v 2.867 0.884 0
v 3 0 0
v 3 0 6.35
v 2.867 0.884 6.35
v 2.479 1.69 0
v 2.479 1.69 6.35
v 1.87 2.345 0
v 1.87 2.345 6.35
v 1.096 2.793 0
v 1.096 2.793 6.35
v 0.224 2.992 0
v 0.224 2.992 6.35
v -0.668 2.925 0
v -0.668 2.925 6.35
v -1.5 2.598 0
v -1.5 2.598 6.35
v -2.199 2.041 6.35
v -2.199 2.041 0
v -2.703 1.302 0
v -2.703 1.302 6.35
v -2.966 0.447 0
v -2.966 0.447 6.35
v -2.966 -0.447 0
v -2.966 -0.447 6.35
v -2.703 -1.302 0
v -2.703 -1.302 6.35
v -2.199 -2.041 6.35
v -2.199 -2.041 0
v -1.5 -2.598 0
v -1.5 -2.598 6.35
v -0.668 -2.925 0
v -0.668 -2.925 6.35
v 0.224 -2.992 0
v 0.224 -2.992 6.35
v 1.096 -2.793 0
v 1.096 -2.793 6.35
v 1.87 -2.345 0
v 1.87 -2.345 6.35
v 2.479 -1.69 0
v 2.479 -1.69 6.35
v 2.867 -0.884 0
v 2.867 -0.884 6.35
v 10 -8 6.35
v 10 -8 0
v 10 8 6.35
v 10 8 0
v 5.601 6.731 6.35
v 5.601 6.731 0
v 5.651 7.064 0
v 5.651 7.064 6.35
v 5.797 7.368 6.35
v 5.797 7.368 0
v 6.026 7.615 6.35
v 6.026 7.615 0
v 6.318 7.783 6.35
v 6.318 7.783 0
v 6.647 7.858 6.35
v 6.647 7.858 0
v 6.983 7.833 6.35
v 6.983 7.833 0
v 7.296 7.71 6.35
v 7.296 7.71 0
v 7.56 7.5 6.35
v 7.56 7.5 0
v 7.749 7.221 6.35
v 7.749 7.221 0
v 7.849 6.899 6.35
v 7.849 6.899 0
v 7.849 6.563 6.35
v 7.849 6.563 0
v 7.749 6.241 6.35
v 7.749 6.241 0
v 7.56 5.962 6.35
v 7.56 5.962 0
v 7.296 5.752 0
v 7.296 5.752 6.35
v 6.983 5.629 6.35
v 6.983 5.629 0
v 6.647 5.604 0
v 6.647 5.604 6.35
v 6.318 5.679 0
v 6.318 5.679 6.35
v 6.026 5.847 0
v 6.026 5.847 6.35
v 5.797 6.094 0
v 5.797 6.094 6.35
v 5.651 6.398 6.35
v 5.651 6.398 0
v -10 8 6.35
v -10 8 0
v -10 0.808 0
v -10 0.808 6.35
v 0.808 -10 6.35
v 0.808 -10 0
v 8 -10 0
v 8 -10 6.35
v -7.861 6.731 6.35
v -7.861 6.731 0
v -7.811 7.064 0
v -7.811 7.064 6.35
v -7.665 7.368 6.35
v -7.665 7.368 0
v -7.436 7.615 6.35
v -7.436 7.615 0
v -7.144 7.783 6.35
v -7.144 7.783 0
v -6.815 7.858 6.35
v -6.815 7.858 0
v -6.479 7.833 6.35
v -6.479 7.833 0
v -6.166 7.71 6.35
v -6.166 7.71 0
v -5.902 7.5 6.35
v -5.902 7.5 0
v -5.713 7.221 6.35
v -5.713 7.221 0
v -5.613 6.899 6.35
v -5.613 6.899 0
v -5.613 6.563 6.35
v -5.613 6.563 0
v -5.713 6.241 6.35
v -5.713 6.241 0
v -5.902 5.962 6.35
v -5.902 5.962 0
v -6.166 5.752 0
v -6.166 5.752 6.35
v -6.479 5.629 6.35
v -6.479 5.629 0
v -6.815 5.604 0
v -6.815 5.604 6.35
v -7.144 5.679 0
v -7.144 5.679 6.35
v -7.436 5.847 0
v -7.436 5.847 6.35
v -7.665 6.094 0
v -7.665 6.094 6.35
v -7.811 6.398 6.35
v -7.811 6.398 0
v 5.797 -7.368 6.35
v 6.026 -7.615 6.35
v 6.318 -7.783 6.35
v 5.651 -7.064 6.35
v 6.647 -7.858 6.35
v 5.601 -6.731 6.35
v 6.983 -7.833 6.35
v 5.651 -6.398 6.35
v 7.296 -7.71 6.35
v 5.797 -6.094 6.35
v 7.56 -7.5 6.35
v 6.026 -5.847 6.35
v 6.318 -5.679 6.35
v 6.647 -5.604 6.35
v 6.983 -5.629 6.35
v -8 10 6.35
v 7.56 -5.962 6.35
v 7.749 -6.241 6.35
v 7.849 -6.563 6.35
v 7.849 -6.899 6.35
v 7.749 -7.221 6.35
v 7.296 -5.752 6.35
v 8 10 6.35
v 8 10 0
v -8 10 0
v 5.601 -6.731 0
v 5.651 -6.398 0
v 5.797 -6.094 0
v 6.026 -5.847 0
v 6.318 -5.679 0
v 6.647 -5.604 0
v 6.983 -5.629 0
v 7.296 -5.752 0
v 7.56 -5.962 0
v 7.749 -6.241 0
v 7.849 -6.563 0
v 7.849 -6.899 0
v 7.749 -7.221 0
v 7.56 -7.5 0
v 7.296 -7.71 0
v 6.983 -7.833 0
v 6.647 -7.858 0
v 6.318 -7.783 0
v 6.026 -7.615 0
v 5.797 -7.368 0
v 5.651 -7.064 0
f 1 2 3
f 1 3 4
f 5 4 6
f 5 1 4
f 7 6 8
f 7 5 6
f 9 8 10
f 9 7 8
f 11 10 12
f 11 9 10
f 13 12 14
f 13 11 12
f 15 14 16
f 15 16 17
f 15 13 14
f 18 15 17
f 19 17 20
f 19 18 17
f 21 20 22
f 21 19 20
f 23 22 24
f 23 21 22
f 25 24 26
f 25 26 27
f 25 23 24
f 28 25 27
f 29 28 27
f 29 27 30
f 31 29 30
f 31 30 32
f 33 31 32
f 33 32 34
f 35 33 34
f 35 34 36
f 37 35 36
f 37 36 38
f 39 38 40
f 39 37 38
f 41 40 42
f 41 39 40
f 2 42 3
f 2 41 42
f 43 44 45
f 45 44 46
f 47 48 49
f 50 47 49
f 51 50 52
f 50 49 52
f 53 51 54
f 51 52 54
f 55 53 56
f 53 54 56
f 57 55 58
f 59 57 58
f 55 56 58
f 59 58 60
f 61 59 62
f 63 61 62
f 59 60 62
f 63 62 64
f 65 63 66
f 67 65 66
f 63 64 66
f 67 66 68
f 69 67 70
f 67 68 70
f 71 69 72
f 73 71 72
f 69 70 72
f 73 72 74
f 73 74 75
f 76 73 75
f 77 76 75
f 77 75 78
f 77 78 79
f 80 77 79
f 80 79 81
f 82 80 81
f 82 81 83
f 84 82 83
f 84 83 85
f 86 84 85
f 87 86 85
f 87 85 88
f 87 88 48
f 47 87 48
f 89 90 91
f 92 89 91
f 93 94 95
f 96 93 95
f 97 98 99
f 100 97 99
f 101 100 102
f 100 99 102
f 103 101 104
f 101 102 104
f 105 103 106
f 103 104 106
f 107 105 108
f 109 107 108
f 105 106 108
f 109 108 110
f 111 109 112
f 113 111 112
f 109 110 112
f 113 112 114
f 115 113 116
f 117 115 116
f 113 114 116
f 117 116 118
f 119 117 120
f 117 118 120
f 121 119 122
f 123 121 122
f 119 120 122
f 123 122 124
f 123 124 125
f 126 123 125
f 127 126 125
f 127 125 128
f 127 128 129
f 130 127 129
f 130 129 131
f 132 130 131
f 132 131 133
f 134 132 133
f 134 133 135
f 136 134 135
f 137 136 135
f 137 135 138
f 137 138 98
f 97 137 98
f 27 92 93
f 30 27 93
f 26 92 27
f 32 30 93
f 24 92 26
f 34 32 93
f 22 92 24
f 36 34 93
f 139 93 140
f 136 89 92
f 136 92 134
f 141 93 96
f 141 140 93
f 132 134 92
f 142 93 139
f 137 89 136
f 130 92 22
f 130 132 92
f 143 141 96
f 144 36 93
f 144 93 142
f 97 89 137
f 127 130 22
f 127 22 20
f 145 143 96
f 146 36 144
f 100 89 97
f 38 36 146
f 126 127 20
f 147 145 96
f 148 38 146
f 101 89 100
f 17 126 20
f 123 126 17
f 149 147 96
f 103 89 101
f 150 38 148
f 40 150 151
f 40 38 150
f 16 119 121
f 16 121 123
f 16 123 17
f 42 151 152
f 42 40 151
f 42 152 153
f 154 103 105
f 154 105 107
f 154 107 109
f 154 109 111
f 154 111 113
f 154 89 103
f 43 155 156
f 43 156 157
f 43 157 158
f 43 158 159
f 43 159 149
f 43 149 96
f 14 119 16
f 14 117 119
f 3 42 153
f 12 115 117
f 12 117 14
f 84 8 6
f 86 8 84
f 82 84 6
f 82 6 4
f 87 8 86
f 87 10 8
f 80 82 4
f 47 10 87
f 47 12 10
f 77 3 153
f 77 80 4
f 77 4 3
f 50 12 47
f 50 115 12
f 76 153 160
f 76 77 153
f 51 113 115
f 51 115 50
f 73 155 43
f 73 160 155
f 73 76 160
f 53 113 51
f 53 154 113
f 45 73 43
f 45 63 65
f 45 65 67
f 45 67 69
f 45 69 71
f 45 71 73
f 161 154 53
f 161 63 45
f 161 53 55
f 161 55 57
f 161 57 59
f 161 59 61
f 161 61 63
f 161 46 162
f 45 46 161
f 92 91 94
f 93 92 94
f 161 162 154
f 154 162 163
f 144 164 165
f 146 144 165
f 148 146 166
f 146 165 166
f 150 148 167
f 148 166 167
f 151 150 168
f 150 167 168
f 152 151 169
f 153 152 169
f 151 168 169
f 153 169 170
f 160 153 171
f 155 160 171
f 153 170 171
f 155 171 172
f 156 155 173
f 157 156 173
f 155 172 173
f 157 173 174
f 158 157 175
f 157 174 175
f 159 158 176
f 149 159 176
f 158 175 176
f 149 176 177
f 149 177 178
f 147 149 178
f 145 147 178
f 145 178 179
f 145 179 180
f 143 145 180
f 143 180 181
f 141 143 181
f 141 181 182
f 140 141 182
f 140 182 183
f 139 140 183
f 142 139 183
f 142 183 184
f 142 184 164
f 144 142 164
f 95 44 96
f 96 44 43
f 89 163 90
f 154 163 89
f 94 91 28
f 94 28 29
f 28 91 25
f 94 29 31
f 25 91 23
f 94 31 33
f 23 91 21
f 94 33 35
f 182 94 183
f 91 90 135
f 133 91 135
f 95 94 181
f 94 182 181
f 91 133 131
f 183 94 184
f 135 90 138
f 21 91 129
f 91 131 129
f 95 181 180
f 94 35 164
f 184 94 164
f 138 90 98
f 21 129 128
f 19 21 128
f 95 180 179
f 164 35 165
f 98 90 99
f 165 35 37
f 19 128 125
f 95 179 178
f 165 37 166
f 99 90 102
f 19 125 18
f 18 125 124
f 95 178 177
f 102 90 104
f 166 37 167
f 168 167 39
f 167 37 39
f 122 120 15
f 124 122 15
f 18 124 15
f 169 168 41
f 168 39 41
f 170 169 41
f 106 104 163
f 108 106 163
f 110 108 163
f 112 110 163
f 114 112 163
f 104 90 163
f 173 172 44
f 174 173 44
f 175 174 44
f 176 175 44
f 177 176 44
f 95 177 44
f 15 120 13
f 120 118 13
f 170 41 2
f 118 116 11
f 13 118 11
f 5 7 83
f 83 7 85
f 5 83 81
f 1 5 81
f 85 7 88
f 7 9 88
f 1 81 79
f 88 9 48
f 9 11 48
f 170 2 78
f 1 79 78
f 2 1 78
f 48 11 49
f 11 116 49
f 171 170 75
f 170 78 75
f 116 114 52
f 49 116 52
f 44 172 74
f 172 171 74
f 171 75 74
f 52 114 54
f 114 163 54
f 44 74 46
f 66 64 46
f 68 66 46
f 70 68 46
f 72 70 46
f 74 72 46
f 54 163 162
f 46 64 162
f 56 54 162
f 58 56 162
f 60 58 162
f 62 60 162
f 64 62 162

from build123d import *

# Parameters (mm, degrees)
SKETCH1_R             = 3
BOSS_EXTRUDE1_DEPTH   = 6.35
F_4_40_TAPPED_HOLE1_D = 2.2606
CHAMFER1_SIZE         = 2


with BuildPart() as part:
    # Sketch1 → Boss-Extrude1 (new body)
    with BuildSketch(Plane.XY):
        Polygon((-10, 0.807611845), (0.807611845, -10), (10, -10), (10, 10), (-10, 10), align=None)
        Circle(SKETCH1_R, mode=Mode.SUBTRACT)
    extrude(amount=BOSS_EXTRUDE1_DEPTH)

    # #4-40 Tapped Hole1 (through all)
    with Locations(Plane.XY.offset(6.35)):
        with Locations((-6.731, 6.731), (6.731, -6.731), (-6.731, -6.731), (6.731, 6.731)):
            Hole(F_4_40_TAPPED_HOLE1_D / 2)

    # Chamfer1
    chamfer1_edges = [part.edges().sort_by_distance(p)[0] for p in [
        (-10, 10, 3.175),
        (10, 10, 3.175),
        (10, -10, 3.175),
    ]]
    chamfer(chamfer1_edges, length=CHAMFER1_SIZE)


solid = part.part
